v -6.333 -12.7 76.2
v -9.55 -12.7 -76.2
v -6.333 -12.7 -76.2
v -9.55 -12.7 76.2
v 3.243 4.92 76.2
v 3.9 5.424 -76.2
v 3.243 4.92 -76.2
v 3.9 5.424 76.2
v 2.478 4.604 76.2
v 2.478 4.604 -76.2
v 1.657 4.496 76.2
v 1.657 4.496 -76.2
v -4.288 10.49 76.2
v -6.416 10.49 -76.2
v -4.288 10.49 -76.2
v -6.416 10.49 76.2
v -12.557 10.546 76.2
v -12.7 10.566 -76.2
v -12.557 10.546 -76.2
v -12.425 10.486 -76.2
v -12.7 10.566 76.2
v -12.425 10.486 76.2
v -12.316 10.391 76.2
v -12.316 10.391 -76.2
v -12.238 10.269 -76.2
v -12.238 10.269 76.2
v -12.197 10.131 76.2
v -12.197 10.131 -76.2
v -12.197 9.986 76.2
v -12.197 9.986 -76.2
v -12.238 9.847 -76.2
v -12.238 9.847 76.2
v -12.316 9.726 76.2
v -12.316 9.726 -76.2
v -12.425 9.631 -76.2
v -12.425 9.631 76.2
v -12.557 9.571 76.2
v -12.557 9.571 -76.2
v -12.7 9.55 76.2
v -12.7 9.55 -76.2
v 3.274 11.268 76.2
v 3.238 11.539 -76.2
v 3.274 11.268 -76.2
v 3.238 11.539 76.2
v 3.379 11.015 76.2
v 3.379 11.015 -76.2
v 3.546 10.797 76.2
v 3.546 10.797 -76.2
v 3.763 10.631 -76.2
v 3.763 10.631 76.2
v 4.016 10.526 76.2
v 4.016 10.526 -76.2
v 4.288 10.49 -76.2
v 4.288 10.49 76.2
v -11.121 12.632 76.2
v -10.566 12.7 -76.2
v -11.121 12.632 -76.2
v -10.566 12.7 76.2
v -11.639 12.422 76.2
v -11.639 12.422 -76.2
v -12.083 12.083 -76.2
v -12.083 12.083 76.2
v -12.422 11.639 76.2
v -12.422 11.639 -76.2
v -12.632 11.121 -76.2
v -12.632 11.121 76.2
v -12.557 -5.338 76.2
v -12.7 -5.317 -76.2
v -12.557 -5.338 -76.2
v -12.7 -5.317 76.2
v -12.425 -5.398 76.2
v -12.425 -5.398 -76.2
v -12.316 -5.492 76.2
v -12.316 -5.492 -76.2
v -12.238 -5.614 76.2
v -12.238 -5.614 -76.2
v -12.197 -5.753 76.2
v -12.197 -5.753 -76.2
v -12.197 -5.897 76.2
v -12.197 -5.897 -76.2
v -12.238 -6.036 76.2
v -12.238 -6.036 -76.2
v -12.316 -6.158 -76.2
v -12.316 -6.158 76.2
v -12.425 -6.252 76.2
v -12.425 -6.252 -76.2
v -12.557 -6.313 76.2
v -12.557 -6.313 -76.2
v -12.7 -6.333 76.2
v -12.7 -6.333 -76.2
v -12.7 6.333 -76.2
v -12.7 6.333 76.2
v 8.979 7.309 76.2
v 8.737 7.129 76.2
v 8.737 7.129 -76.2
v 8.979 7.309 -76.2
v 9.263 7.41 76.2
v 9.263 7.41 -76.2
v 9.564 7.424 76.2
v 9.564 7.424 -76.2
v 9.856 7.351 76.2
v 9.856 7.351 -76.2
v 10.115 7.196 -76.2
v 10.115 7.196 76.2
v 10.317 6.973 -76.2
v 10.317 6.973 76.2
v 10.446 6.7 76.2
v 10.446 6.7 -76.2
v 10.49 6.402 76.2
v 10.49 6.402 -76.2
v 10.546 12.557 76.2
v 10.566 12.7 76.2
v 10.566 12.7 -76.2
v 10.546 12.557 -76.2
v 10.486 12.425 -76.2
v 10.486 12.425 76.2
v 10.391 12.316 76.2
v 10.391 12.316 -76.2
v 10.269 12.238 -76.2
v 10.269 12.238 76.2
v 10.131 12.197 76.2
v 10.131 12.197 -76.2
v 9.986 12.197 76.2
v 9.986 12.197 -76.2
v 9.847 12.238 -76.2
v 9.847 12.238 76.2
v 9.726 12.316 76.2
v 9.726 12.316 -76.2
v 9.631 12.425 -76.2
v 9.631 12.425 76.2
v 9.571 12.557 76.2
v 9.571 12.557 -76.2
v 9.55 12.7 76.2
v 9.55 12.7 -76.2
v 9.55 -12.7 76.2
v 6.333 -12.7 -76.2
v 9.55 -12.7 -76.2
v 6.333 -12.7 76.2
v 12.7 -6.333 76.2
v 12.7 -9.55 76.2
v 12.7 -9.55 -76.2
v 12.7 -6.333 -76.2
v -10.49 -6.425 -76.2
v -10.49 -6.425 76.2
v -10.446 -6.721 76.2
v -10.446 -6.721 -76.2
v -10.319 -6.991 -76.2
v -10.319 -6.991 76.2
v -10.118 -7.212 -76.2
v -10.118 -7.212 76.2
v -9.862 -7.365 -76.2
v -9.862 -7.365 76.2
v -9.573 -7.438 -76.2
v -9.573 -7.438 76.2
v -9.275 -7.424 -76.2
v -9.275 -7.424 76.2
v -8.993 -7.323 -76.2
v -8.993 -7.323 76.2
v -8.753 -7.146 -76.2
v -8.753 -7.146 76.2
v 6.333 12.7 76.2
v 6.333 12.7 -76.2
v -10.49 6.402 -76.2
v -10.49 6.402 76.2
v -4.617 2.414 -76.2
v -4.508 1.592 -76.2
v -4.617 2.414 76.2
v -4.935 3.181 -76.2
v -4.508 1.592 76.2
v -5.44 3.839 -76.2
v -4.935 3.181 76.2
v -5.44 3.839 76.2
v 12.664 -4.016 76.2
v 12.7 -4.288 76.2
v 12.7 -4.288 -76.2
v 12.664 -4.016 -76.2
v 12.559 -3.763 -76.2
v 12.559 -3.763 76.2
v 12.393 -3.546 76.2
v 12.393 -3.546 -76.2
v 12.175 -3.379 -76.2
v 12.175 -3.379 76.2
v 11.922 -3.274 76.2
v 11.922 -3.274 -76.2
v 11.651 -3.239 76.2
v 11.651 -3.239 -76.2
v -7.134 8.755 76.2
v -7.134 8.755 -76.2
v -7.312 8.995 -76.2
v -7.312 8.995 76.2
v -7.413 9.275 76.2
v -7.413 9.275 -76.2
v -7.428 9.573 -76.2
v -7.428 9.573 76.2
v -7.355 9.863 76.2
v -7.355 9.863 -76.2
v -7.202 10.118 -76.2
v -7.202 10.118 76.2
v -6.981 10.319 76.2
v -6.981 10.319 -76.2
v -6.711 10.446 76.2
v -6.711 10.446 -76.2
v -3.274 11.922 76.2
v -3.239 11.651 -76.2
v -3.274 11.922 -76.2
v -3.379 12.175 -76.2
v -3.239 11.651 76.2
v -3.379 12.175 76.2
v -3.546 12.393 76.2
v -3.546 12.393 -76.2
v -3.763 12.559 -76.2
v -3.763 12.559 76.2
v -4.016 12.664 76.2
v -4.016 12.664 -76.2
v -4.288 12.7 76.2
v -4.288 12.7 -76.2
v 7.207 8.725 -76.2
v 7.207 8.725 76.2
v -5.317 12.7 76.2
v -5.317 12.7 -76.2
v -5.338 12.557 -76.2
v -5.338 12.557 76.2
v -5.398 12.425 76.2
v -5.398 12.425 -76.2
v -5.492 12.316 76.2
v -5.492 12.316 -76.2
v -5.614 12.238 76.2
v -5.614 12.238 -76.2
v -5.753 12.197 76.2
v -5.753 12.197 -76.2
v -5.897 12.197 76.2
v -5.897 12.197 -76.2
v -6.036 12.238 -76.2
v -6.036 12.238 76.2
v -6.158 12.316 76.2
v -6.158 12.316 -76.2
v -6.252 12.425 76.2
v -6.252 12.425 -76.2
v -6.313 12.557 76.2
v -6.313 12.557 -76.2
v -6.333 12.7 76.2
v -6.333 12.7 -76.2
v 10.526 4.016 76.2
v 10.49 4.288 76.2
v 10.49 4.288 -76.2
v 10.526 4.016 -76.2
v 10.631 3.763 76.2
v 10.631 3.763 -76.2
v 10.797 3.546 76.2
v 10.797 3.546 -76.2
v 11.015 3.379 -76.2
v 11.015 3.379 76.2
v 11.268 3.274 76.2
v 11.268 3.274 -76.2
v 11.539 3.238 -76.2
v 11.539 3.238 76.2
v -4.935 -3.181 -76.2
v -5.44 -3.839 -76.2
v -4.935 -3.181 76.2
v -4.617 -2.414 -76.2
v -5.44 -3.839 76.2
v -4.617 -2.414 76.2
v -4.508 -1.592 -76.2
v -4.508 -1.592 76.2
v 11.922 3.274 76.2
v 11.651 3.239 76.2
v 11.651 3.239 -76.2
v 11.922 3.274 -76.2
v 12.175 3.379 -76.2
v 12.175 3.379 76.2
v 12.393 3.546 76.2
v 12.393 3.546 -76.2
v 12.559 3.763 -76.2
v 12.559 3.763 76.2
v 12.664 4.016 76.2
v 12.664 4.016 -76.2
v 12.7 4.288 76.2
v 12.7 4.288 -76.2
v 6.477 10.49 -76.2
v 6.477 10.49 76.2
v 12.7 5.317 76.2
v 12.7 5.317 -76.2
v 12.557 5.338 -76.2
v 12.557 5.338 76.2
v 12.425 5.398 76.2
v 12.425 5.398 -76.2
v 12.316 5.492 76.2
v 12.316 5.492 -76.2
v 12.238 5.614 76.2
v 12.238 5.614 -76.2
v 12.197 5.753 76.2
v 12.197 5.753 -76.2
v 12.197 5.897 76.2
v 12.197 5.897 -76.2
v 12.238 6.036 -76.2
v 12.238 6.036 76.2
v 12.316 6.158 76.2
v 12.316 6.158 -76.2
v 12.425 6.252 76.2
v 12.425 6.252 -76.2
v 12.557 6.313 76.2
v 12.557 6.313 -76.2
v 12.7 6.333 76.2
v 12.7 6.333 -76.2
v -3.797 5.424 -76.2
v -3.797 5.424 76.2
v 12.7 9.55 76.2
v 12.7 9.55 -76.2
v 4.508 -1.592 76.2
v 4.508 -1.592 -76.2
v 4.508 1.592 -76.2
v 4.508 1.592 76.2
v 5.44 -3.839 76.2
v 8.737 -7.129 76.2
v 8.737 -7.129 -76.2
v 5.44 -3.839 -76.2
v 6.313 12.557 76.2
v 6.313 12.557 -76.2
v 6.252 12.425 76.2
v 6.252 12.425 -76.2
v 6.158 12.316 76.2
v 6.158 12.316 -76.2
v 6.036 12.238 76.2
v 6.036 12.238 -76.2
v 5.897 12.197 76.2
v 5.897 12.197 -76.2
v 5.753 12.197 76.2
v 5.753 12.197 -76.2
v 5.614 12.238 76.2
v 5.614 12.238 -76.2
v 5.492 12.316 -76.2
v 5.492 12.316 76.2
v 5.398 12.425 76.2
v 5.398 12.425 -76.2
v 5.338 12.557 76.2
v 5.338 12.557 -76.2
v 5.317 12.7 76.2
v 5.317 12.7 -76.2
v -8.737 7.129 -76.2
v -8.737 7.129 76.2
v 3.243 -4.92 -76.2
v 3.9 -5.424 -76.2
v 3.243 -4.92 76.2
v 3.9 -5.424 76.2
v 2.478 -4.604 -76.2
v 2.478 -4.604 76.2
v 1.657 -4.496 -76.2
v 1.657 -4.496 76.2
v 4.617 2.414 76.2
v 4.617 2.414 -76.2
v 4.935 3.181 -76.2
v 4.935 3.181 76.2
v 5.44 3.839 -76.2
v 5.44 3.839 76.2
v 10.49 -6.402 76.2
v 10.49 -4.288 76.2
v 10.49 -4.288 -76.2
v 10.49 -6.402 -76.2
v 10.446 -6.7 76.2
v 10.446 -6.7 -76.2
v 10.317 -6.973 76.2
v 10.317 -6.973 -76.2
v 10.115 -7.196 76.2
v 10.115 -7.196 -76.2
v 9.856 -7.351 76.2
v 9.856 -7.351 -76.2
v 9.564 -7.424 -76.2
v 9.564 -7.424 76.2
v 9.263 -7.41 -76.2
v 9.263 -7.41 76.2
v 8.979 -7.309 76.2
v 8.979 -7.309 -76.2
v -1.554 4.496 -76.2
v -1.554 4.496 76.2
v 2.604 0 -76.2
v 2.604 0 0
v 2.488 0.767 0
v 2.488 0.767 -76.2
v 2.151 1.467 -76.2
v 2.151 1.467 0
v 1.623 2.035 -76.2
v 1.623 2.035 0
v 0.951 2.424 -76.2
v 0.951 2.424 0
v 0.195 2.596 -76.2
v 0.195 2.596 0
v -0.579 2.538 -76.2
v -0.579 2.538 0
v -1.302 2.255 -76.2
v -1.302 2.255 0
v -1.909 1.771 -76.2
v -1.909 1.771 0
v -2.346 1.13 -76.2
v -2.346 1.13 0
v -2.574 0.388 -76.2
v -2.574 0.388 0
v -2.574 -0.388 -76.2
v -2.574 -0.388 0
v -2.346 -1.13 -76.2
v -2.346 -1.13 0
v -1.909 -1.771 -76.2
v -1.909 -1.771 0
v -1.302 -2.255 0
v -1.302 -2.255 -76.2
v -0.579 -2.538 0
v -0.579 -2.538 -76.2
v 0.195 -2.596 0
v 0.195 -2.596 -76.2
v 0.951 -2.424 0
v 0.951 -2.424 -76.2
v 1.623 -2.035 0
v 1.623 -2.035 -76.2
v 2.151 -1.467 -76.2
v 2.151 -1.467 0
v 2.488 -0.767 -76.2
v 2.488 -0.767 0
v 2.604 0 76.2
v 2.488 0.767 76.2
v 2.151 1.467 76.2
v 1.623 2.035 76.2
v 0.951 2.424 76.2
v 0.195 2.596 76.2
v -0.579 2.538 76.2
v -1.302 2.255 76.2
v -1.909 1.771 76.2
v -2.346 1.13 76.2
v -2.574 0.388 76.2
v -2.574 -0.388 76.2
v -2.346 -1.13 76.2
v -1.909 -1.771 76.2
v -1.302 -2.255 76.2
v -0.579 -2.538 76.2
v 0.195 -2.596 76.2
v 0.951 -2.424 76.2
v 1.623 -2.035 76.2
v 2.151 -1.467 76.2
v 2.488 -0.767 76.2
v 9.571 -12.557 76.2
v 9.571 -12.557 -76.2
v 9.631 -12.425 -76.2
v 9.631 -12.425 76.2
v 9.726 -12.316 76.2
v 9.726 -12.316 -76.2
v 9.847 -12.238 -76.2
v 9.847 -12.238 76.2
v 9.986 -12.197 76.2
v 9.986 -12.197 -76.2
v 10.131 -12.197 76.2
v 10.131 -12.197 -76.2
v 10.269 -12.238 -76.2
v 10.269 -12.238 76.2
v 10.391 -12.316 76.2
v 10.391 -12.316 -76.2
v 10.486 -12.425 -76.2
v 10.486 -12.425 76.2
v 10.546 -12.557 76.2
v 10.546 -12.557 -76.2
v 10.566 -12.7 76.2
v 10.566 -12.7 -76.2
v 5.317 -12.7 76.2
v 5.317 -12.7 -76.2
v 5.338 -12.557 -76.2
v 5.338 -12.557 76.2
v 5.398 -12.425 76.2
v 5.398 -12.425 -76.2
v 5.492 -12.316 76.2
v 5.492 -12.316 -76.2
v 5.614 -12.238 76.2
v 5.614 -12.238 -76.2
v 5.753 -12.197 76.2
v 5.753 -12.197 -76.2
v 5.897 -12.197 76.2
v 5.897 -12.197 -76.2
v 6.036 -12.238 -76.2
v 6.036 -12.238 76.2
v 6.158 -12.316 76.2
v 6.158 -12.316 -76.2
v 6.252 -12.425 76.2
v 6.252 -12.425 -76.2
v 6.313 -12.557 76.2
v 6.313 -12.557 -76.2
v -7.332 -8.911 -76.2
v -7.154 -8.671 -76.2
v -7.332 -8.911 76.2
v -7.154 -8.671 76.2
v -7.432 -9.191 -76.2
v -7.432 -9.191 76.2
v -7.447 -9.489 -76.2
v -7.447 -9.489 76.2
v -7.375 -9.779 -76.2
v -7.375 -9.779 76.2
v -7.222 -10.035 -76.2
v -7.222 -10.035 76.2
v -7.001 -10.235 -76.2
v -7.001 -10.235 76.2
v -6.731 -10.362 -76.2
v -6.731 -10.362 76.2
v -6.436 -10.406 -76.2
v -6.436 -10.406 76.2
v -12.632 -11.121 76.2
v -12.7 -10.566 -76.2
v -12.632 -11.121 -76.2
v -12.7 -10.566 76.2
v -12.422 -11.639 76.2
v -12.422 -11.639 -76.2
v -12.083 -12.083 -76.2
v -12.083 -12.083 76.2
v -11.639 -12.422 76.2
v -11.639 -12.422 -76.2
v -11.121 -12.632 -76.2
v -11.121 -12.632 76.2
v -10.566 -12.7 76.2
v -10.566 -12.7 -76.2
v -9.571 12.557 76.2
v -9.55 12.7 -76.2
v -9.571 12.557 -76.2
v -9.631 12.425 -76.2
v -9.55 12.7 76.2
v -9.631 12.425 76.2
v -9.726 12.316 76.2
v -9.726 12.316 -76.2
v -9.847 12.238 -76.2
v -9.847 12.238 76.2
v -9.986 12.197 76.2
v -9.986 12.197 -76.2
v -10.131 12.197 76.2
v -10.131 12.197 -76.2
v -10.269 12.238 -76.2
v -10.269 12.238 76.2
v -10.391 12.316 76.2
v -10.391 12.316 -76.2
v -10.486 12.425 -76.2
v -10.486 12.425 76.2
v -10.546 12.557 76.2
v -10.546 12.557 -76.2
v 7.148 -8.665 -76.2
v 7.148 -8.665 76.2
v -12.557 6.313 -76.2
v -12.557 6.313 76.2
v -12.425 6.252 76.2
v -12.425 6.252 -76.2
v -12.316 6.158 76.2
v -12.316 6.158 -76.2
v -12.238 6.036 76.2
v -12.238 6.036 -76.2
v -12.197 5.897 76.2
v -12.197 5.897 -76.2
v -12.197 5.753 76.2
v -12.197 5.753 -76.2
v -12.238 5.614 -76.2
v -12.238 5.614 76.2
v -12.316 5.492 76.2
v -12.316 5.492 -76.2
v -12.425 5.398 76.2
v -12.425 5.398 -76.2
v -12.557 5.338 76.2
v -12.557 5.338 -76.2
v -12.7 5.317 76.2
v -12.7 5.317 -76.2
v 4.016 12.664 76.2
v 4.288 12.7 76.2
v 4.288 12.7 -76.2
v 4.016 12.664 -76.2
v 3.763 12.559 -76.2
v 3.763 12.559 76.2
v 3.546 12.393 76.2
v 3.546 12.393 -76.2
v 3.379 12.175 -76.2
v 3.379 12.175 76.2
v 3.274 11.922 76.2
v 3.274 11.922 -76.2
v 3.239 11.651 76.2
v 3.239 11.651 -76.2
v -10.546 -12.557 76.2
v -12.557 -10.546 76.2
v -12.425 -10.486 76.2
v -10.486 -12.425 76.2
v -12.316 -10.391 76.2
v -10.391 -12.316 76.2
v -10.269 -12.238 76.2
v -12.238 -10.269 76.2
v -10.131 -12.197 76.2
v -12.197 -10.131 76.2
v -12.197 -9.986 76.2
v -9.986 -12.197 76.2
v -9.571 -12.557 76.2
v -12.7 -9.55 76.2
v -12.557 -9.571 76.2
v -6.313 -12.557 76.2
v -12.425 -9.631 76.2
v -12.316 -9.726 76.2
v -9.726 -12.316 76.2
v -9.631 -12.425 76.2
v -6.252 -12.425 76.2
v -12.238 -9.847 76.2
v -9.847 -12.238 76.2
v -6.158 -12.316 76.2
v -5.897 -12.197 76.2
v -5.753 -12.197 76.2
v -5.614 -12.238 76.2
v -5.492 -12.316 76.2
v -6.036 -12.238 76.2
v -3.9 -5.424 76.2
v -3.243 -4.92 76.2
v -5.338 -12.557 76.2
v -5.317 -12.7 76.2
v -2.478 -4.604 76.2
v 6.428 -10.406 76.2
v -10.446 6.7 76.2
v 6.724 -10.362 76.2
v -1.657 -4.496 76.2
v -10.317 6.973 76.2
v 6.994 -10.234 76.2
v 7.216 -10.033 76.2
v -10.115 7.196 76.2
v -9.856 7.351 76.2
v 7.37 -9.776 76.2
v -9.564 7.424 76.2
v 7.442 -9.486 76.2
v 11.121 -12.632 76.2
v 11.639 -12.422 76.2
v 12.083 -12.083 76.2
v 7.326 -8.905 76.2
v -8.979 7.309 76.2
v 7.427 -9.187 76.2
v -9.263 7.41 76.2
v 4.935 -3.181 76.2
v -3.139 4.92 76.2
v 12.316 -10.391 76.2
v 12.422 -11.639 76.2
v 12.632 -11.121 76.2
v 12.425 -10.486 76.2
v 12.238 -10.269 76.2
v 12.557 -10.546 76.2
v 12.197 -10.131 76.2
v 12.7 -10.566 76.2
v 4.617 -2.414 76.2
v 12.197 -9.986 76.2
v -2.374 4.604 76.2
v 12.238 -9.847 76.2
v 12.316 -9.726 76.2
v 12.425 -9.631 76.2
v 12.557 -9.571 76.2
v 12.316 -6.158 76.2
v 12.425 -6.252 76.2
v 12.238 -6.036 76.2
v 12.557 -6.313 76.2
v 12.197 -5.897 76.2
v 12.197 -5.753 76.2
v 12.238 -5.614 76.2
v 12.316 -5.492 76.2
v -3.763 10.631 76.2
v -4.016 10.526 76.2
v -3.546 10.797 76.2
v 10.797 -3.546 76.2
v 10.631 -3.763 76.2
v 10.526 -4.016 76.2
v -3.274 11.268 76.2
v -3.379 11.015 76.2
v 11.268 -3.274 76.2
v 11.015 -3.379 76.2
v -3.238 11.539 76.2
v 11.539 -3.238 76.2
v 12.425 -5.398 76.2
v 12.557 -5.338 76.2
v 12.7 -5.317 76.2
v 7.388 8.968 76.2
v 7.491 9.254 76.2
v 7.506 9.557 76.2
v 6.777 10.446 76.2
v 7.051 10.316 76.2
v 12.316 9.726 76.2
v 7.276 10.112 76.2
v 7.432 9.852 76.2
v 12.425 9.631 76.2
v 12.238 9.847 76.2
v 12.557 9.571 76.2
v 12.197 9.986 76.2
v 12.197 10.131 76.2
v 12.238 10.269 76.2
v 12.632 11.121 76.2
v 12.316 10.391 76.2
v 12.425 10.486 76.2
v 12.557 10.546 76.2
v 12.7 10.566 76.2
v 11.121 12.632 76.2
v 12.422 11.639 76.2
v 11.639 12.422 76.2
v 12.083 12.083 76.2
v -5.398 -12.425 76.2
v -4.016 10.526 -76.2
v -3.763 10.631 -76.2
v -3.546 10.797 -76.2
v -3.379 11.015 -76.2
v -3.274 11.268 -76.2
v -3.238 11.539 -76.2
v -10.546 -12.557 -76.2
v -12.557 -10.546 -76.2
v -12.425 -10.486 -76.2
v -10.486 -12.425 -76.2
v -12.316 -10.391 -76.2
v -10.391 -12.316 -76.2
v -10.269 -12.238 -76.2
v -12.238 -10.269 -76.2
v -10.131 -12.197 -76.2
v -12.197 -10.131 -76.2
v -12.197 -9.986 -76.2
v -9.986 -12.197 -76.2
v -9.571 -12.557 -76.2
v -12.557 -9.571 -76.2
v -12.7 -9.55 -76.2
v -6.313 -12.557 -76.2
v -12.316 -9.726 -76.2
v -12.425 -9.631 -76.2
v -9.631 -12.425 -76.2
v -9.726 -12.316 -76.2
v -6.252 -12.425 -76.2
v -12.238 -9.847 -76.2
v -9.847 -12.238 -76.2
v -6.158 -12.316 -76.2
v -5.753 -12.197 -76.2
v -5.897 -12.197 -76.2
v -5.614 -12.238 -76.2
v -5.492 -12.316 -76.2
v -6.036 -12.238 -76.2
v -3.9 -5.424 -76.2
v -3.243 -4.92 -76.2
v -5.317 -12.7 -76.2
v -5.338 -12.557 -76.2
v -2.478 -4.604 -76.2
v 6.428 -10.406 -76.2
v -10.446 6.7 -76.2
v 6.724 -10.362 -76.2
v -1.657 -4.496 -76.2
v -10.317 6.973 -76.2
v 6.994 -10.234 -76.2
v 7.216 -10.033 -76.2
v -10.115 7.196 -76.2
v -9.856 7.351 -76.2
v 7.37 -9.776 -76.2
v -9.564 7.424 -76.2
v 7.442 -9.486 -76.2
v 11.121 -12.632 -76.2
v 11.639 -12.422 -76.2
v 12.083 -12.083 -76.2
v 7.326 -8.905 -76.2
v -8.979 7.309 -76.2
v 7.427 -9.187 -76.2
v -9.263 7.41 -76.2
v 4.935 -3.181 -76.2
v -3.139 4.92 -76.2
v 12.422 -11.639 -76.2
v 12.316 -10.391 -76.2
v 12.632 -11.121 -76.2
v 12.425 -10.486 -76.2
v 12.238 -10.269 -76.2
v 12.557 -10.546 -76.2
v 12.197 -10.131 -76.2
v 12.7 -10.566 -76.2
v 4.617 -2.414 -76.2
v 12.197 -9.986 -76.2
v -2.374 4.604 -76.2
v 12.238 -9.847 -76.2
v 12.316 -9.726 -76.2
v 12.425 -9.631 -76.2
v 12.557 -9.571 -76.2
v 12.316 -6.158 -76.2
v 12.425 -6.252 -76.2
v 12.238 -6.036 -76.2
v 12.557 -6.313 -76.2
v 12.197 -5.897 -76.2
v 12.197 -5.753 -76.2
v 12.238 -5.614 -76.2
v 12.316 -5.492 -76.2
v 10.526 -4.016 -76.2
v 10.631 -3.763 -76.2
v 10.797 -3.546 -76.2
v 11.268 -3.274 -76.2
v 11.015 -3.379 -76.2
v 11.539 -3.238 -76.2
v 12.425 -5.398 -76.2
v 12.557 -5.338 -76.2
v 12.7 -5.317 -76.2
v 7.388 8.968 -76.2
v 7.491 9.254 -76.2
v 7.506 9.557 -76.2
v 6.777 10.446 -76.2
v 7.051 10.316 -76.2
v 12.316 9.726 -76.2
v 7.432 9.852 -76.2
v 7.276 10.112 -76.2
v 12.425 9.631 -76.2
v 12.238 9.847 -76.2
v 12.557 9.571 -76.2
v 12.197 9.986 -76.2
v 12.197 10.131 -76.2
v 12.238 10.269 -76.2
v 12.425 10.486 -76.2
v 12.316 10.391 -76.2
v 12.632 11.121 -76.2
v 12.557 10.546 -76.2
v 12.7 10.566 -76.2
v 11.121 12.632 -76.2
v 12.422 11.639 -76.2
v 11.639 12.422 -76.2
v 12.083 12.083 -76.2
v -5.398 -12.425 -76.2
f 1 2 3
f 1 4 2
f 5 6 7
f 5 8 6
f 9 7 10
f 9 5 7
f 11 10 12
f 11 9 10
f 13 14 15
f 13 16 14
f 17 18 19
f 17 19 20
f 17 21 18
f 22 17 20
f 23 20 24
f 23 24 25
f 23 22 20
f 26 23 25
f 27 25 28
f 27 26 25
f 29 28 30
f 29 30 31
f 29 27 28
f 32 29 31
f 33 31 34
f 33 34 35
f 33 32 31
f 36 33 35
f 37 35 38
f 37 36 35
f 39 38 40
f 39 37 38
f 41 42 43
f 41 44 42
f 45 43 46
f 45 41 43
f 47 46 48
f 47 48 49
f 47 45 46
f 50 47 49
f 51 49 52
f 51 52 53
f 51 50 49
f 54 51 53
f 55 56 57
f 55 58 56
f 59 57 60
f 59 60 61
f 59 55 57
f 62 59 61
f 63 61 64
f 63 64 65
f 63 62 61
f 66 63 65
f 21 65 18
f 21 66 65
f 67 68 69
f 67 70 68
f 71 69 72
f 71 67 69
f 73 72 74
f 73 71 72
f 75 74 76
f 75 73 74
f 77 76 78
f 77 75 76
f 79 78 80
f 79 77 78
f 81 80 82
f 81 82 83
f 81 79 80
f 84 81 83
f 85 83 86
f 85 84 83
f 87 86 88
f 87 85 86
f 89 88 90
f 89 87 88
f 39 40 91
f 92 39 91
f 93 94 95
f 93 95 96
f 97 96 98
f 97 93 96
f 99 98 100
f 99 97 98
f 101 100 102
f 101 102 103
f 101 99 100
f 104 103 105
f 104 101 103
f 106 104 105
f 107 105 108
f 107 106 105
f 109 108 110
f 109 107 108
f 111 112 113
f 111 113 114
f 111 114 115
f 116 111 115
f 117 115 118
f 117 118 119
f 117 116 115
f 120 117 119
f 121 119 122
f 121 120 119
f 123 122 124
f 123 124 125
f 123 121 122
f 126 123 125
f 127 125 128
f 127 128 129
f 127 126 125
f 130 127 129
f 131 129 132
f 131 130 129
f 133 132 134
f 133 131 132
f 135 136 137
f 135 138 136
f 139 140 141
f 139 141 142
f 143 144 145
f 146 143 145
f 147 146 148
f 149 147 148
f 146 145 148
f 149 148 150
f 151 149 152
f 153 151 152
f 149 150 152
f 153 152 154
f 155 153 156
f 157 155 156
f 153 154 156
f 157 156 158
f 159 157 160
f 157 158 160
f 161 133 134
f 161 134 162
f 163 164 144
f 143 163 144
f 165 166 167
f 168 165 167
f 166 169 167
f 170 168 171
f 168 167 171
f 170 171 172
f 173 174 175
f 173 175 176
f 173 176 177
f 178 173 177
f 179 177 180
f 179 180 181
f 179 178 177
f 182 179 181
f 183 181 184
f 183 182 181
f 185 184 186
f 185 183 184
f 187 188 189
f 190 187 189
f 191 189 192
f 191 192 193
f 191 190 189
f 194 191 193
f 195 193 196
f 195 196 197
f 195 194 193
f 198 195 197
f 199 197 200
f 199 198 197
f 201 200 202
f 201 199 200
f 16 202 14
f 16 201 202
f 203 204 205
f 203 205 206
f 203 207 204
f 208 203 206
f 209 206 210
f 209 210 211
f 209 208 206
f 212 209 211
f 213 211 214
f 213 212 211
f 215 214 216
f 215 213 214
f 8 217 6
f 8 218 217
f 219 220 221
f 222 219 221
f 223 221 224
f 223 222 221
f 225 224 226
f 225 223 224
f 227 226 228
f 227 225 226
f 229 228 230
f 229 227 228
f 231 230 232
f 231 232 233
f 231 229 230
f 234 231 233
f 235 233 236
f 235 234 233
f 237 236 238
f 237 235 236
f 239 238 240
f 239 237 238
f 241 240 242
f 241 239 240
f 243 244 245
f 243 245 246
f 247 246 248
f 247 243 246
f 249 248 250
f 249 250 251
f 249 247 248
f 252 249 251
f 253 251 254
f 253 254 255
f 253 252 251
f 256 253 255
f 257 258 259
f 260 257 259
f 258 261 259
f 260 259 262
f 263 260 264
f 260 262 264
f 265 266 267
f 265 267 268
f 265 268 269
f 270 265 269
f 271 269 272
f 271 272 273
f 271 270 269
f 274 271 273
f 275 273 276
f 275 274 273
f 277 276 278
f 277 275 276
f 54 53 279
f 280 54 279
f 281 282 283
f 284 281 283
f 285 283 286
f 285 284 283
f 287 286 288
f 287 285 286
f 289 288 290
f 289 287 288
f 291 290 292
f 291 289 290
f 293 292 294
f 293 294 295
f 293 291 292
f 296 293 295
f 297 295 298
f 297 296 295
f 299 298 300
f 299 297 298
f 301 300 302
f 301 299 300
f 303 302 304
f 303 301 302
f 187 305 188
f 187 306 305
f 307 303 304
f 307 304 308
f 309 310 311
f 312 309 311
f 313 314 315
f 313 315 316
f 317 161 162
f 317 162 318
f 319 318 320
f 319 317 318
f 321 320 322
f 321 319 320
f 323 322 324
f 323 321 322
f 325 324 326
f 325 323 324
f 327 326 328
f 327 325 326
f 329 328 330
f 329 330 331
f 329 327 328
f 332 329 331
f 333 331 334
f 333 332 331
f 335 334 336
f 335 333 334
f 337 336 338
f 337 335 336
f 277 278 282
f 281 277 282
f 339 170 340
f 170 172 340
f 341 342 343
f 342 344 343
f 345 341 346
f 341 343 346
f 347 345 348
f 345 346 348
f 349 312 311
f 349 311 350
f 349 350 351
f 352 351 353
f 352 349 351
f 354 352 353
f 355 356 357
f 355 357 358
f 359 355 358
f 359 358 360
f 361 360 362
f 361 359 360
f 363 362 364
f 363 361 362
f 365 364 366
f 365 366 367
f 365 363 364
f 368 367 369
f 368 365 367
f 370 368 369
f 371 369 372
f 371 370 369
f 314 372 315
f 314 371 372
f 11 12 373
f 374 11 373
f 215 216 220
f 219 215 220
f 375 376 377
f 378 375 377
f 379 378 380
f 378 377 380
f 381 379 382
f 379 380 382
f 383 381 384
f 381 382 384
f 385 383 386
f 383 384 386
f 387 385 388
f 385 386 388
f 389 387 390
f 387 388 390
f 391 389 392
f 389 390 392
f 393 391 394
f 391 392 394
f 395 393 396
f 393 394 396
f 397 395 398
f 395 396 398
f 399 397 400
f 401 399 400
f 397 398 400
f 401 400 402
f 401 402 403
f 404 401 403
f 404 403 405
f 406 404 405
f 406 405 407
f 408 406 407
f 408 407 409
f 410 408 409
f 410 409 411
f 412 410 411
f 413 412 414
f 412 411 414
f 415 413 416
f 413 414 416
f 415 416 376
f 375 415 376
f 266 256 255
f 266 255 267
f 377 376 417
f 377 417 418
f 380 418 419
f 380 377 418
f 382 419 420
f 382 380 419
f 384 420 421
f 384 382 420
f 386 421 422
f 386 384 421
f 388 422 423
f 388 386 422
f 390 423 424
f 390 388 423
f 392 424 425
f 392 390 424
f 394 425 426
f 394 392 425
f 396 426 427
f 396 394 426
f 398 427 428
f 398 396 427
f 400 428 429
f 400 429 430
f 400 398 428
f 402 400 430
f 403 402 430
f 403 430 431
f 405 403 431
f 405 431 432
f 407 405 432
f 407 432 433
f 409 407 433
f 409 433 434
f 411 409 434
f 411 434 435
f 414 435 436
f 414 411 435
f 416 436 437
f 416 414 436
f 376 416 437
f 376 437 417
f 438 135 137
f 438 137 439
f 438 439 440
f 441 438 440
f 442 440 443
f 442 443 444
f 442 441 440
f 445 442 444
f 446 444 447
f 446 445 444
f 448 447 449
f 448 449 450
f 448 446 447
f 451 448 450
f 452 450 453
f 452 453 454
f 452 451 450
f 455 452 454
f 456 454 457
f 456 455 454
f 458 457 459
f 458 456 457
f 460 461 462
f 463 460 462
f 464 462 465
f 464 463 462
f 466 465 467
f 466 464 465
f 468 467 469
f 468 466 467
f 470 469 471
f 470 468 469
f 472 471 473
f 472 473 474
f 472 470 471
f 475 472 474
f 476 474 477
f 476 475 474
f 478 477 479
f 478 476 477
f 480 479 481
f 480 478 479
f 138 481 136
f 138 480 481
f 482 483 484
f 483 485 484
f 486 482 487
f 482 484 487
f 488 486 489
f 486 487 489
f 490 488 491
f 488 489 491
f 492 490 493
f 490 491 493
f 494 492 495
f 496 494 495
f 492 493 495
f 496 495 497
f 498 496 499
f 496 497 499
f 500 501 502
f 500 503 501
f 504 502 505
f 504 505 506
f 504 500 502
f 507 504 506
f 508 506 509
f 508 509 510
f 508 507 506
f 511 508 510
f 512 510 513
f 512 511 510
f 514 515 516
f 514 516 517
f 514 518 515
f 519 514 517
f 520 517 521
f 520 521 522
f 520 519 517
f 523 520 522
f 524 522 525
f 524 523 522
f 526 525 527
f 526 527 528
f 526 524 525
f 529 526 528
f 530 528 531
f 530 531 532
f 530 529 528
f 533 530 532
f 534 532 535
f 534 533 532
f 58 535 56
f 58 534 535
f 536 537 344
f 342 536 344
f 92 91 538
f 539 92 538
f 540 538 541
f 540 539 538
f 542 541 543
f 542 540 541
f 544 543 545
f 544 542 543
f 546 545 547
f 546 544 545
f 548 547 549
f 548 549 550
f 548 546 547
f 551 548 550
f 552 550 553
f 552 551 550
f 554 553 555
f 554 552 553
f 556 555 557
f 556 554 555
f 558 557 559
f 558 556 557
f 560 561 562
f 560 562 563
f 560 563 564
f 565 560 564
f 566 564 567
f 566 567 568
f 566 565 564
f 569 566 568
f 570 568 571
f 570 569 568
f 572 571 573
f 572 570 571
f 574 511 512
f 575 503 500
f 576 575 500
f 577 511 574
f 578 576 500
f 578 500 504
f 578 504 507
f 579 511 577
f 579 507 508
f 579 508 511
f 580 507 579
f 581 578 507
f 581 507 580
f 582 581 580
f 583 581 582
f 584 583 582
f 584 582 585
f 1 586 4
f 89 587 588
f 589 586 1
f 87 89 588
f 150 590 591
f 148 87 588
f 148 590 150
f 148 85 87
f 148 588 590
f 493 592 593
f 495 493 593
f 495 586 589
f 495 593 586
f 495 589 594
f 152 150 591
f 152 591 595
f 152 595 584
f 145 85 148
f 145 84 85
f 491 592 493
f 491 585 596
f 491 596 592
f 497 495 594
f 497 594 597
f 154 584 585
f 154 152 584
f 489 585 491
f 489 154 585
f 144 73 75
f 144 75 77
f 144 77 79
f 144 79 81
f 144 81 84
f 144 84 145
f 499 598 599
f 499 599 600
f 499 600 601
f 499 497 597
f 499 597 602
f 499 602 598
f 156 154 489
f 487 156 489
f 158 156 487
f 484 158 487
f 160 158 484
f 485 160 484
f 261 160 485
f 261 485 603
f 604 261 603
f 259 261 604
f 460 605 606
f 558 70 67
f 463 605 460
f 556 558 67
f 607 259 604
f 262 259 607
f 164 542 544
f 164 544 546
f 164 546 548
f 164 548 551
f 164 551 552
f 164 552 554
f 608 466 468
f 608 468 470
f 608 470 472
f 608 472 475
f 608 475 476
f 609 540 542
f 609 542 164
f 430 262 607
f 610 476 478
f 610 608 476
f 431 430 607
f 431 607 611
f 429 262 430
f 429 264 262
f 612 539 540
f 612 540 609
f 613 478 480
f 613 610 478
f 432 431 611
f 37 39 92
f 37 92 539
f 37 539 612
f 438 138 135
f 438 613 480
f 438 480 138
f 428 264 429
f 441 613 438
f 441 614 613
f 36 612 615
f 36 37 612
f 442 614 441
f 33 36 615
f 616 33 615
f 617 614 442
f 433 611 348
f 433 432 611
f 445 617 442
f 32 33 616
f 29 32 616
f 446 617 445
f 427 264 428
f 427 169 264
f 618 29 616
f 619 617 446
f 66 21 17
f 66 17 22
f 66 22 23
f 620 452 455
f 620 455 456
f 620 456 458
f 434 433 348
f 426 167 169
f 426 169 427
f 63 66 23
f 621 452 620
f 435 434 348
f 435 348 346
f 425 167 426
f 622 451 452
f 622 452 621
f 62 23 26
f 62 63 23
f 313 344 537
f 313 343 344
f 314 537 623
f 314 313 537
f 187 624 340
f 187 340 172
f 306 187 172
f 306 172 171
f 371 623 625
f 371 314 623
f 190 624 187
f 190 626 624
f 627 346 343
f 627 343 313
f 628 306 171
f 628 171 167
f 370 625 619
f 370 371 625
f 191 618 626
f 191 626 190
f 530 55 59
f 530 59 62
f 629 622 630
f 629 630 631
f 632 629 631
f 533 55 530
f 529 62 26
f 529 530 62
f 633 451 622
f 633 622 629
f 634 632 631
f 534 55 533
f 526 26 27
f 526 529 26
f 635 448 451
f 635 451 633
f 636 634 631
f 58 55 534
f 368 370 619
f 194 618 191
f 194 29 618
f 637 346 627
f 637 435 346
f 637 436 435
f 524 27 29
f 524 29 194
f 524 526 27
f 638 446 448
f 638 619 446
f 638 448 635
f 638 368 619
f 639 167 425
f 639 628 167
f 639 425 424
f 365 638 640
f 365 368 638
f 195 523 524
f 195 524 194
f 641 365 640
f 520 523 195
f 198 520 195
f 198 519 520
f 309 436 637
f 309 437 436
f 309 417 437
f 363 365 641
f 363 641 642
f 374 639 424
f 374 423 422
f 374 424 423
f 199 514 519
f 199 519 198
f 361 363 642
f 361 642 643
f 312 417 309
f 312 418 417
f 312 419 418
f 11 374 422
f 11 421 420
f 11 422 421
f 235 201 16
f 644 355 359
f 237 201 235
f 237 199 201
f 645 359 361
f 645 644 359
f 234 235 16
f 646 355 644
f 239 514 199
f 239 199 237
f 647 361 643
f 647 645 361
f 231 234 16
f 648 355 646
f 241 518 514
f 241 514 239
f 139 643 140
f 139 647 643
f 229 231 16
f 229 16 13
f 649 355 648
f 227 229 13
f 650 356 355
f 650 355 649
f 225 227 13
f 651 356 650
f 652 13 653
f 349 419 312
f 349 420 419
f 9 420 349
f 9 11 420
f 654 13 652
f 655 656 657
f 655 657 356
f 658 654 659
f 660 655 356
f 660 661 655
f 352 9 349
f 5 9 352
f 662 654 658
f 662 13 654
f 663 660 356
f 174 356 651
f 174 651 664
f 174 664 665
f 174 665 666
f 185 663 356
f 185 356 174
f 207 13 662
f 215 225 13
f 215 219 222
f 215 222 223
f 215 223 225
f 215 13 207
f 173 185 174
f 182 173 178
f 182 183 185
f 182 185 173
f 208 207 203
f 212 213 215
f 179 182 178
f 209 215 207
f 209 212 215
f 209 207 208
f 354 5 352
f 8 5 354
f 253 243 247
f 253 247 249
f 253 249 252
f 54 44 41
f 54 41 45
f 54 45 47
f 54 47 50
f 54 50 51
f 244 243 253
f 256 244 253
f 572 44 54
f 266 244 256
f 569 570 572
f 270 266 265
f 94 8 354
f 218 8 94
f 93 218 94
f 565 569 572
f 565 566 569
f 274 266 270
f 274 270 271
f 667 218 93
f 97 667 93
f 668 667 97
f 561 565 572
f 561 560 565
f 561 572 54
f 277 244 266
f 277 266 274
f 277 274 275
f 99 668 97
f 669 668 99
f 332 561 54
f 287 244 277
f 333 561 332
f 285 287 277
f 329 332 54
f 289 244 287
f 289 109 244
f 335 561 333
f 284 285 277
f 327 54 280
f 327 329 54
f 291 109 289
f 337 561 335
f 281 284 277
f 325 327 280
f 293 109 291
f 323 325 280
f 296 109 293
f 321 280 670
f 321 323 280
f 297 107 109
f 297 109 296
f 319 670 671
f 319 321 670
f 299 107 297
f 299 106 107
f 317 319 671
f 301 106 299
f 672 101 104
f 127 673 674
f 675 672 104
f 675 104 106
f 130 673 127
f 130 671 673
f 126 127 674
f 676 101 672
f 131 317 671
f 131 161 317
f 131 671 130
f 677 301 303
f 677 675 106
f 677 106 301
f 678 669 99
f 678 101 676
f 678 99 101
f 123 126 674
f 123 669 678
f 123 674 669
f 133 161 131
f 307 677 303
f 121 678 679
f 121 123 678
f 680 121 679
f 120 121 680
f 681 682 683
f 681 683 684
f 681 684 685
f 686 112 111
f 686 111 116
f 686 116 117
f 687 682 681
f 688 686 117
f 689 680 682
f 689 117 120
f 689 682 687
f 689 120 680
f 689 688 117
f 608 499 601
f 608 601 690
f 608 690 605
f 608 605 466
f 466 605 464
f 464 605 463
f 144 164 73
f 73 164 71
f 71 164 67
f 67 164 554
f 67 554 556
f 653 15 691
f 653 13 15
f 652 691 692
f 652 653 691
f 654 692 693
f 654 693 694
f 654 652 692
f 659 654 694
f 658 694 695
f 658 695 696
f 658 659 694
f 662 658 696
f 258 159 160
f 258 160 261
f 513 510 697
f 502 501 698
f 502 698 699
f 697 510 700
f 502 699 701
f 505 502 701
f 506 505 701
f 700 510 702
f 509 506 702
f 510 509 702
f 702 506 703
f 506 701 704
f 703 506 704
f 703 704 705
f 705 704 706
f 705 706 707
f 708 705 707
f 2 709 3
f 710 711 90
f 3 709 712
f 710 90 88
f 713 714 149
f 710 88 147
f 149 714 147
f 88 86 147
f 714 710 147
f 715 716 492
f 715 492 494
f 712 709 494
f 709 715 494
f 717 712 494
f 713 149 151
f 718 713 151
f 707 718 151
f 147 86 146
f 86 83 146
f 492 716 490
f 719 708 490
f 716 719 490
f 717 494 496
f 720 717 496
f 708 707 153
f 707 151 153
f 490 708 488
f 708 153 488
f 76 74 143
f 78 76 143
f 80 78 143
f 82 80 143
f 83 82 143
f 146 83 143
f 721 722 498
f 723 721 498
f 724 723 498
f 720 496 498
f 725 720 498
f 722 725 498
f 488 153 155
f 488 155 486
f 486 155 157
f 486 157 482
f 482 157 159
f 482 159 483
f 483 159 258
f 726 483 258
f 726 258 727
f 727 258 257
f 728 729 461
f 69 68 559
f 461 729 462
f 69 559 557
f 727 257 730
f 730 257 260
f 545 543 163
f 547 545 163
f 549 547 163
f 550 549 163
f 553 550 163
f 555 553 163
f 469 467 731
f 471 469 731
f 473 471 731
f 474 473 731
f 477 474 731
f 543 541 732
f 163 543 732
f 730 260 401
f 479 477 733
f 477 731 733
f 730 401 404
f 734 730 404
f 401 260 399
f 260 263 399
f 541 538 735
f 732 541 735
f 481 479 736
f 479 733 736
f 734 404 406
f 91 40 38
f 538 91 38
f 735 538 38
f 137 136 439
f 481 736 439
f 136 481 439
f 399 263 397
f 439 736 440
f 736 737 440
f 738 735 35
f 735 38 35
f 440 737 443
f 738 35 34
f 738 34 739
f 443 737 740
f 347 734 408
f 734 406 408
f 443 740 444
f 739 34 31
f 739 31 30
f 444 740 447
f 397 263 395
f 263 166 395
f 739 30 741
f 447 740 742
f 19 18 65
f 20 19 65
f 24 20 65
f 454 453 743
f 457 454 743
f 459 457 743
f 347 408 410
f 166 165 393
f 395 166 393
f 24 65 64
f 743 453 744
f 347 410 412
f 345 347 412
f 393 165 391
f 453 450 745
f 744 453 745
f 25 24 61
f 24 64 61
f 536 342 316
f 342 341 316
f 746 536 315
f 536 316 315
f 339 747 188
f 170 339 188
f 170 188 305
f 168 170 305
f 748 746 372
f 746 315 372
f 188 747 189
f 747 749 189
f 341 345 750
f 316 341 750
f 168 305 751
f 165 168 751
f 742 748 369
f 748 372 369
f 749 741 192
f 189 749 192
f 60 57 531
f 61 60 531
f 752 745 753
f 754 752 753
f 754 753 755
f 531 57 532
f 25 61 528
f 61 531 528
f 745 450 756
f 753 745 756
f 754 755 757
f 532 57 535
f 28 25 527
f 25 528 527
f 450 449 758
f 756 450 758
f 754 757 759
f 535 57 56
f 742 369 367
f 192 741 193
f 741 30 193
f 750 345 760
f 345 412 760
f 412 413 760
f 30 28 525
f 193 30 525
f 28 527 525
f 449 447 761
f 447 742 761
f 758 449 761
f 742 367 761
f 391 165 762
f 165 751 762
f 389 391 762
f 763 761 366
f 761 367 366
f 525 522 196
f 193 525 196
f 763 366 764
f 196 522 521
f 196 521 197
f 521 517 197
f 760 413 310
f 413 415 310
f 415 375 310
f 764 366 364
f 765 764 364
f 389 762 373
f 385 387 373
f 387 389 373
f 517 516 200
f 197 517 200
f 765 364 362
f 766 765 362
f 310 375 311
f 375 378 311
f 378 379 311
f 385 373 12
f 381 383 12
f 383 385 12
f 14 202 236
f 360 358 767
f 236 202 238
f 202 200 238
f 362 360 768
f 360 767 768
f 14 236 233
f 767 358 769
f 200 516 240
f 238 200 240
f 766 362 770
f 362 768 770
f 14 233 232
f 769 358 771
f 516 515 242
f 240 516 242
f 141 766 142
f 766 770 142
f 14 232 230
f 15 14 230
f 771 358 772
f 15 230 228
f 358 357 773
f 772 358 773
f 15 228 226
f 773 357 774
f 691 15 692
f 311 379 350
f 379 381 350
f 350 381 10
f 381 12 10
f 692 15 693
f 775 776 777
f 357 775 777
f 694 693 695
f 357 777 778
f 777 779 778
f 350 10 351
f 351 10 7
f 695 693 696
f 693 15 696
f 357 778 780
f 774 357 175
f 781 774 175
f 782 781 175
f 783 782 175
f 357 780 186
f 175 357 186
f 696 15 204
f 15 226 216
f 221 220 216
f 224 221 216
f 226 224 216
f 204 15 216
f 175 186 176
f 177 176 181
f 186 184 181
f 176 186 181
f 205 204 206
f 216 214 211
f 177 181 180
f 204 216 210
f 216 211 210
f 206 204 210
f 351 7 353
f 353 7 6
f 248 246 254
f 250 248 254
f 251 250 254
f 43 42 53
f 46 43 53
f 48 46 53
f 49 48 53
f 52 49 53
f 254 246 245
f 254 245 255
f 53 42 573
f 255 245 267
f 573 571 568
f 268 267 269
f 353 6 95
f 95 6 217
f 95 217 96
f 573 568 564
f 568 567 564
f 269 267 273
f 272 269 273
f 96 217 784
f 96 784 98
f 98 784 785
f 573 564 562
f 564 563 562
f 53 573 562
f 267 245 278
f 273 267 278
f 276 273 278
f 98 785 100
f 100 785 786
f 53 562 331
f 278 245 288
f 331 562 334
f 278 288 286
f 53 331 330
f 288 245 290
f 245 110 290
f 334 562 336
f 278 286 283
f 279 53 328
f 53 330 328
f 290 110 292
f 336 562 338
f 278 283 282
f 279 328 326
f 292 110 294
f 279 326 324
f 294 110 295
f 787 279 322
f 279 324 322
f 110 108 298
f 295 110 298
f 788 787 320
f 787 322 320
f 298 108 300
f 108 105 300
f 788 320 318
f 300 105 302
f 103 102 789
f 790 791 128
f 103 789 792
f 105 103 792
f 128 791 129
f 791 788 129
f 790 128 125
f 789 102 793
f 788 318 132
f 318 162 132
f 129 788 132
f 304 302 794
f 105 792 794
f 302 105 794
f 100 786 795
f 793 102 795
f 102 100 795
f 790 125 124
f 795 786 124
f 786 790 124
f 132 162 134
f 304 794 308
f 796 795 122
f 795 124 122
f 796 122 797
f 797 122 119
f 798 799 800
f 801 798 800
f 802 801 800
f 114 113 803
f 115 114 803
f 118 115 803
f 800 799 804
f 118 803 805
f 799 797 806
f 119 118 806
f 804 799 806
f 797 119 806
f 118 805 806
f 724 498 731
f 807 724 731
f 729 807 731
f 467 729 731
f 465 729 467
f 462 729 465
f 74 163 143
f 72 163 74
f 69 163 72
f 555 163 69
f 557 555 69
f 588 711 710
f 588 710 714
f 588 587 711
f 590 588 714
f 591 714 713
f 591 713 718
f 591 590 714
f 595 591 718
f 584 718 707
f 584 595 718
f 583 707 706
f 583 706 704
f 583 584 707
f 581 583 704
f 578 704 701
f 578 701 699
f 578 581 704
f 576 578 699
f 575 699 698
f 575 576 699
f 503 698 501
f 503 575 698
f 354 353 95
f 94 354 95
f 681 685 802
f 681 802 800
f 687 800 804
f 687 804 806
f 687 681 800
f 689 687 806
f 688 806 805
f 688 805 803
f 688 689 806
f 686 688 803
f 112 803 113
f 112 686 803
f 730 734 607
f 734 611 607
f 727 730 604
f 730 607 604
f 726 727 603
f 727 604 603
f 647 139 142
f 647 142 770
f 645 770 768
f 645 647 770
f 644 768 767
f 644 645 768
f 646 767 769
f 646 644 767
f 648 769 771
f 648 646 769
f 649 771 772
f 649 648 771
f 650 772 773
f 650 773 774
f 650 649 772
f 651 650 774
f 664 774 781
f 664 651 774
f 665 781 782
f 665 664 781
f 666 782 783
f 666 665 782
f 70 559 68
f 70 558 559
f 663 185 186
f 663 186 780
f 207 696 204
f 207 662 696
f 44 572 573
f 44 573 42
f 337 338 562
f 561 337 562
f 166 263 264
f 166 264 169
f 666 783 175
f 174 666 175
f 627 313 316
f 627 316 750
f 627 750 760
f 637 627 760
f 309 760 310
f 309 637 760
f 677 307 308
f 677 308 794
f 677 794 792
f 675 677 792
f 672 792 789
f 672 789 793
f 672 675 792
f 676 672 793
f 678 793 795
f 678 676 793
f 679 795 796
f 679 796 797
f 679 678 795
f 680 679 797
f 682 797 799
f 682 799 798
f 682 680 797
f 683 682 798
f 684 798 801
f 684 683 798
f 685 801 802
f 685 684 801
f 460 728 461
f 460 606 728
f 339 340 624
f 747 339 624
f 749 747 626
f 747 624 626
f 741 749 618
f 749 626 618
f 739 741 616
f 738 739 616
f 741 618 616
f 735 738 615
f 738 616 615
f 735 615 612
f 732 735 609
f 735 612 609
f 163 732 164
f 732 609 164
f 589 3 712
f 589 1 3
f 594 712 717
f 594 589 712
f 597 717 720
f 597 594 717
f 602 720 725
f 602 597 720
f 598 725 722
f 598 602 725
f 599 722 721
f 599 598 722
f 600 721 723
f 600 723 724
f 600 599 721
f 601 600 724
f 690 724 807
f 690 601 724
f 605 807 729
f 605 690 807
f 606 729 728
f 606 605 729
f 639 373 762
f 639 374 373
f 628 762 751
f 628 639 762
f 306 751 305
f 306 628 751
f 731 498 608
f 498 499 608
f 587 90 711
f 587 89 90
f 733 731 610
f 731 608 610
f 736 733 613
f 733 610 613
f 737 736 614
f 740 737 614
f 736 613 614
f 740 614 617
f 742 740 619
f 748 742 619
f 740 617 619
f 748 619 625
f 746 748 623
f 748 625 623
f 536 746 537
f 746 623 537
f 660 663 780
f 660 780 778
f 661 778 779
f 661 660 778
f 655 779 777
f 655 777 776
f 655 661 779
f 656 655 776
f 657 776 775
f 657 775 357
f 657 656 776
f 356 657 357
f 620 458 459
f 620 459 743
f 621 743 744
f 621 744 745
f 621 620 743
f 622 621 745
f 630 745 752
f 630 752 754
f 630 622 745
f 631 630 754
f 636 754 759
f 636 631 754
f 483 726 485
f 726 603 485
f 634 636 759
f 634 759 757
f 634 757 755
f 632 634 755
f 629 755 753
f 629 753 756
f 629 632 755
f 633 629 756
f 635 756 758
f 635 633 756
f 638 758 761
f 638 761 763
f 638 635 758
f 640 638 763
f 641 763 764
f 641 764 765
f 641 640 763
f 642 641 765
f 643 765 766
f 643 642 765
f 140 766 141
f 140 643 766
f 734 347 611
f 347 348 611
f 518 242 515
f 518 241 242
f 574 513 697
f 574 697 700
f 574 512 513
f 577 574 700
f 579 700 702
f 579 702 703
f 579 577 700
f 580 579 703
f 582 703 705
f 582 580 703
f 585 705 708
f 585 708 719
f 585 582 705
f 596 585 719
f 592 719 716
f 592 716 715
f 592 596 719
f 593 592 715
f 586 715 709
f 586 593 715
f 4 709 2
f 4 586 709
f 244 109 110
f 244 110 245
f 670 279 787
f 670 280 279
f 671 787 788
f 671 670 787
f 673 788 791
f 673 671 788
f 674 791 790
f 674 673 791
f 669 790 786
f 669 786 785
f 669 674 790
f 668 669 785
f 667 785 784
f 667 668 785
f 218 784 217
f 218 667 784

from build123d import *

# Parameters (mm, degrees)
SKETCH3_R                = 2.6035
BOSS_EXTRUDE1_DEPTH      = 76.2
BOSS_EXTRUDE1_DEPTH_BACK = 76.2


with BuildPart() as part:
    # Sketch3 → Boss-Extrude1 (new body, two sides)
    with BuildSketch(Plane.XY) as boss_extrude1_sk:
        with BuildLine():
            Line((6.3331344, -12.7), (9.5504, -12.7))
            ThreePointArc((9.5504, -12.7), (10.058323491, -12.192000006), (10.566399977, -12.699846982))
            ThreePointArc((10.566399977, -12.699846982), (12.082522516, -12.082522516), (12.699846982, -10.566399977))
            ThreePointArc((12.699846982, -10.566399977), (12.192000006, -10.058323491), (12.7, -9.5504))
            Line((12.7, -9.5504), (12.7, -6.3330836))
            ThreePointArc((12.7, -6.3330836), (12.192, -5.8250836), (12.7, -5.3170836))
            Line((12.7, -5.3170836), (12.7, -4.28752))
            ThreePointArc((12.7, -4.28752), (12.392749156, -3.545750844), (11.65098, -3.2385))
            Line((11.65098, -3.2385), (11.53922, -3.2385))
            ThreePointArc((11.53922, -3.2385), (10.797450844, -3.545750844), (10.4902, -4.28752))
            Line((10.4902, -4.28752), (10.4902, -6.402089023))
            ThreePointArc((10.4902, -6.402089023), (9.856394933, -7.351113629), (8.736962546, -7.129240479))
            Line((8.736962546, -7.129240479), (5.440484187, -3.838768792))
            ThreePointArc((5.440484187, -3.838768792), (4.75073678, -2.808015636), (4.5085, -1.591658411))
            Line((4.5085, -1.591658411), (4.5085, 1.591658411))
            ThreePointArc((4.5085, 1.591658411), (4.75073678, 2.808015636), (5.440484187, 3.838768792))
            Line((5.440484187, 3.838768792), (8.736962546, 7.129240479))
            ThreePointArc((8.736962546, 7.129240479), (9.856394933, 7.351113629), (10.4902, 6.402089023))
            Line((10.4902, 6.402089023), (10.4902, 4.28752))
            ThreePointArc((10.4902, 4.28752), (10.797450844, 3.545750844), (11.53922, 3.2385))
            Line((11.53922, 3.2385), (11.65098, 3.2385))
            ThreePointArc((11.65098, 3.2385), (12.392749156, 3.545750844), (12.7, 4.28752))
            Line((12.7, 4.28752), (12.7, 5.3171344))
            ThreePointArc((12.7, 5.3171344), (12.192, 5.8251344), (12.7, 6.3331344))
            Line((12.7, 6.3331344), (12.7, 9.5504))
            ThreePointArc((12.7, 9.5504), (12.192000006, 10.058323491), (12.699846982, 10.566399977))
            ThreePointArc((12.699846982, 10.566399977), (12.082522516, 12.082522516), (10.566399977, 12.699846982))
            ThreePointArc((10.566399977, 12.699846982), (10.058323491, 12.192000006), (9.5504, 12.7))
            Line((9.5504, 12.7), (6.3330836, 12.7))
            ThreePointArc((6.3330836, 12.7), (5.8250836, 12.192), (5.3170836, 12.7))
            Line((5.3170836, 12.7), (4.28752, 12.7))
            ThreePointArc((4.28752, 12.7), (3.545750844, 12.392749156), (3.2385, 11.65098))
            Line((3.2385, 11.65098), (3.2385, 11.53922))
            ThreePointArc((3.2385, 11.53922), (3.545750844, 10.797450844), (4.28752, 10.4902))
            Line((4.28752, 10.4902), (6.476795923, 10.4902))
            ThreePointArc((6.476795923, 10.4902), (7.432175542, 9.851520654), (7.207206853, 8.724555432))
            Line((7.207206853, 8.724555432), (3.900315394, 5.423689619))
            ThreePointArc((3.900315394, 5.423689619), (2.8709819, 4.736928798), (1.657299581, 4.4958))
            Line((1.657299581, 4.4958), (-1.553667902, 4.4958))
            ThreePointArc((-1.553667902, 4.4958), (-2.767350221, 4.736928798), (-3.796683715, 5.423689619))
            Line((-3.796683715, 5.423689619), (-7.134200223, 8.755124678))
            ThreePointArc((-7.134200223, 8.755124678), (-7.355273948, 9.862578342), (-6.416435163, 10.4902))
            Line((-6.416435163, 10.4902), (-4.28752, 10.4902))
            ThreePointArc((-4.28752, 10.4902), (-3.545750844, 10.797450844), (-3.2385, 11.53922))
            Line((-3.2385, 11.53922), (-3.2385, 11.65098))
            ThreePointArc((-3.2385, 11.65098), (-3.545750844, 12.392749156), (-4.28752, 12.7))
            Line((-4.28752, 12.7), (-5.3171344, 12.7))
            ThreePointArc((-5.3171344, 12.7), (-5.8251344, 12.192), (-6.3331344, 12.7))
            Line((-6.3331344, 12.7), (-9.5504, 12.7))
            ThreePointArc((-9.5504, 12.7), (-10.058323491, 12.192000006), (-10.566399977, 12.699846982))
            ThreePointArc((-10.566399977, 12.699846982), (-12.082522516, 12.082522516), (-12.699846982, 10.566399977))
            ThreePointArc((-12.699846982, 10.566399977), (-12.192000006, 10.058323491), (-12.7, 9.5504))
            Line((-12.7, 9.5504), (-12.7, 6.3331344))
            ThreePointArc((-12.7, 6.3331344), (-12.192, 5.8251344), (-12.7, 5.3171344))
            Line((-12.7, 5.3171344), (-12.7, -5.3170836))
            ThreePointArc((-12.7, -5.3170836), (-12.192, -5.8250836), (-12.7, -6.3330836))
            Line((-12.7, -6.3330836), (-12.7, -9.5504))
            ThreePointArc((-12.7, -9.5504), (-12.192000006, -10.058323491), (-12.699846982, -10.566399977))
            ThreePointArc((-12.699846982, -10.566399977), (-12.082522516, -12.082522516), (-10.566399977, -12.699846982))
            ThreePointArc((-10.566399977, -12.699846982), (-10.058323491, -12.192000006), (-9.5504, -12.7))
            Line((-9.5504, -12.7), (-6.3330836, -12.7))
            ThreePointArc((-6.3330836, -12.7), (-5.8250836, -12.192), (-5.3170836, -12.7))
            Line((-5.3170836, -12.7), (5.3171344, -12.7))
            ThreePointArc((5.3171344, -12.7), (5.8251344, -12.192), (6.3331344, -12.7))
        make_face()
        Circle(SKETCH3_R, mode=Mode.SUBTRACT)
        with BuildLine():
            Line((-8.753441447, -7.145689354), (-5.440484187, -3.838768792))
            ThreePointArc((-5.440484187, -3.838768792), (-4.75073678, -2.808015636), (-4.5085, -1.591658411))
            Line((-4.5085, -1.591658411), (-4.5085, 1.591658411))
            ThreePointArc((-4.5085, 1.591658411), (-4.75073678, 2.808015636), (-5.440484187, 3.838768792))
            Line((-5.440484187, 3.838768792), (-8.736962546, 7.129240479))
            ThreePointArc((-8.736962546, 7.129240479), (-9.856394933, 7.351113629), (-10.4902, 6.402089023))
            Line((-10.4902, 6.402089023), (-10.4902, -6.425372487))
            ThreePointArc((-10.4902, -6.425372487), (-9.862352148, -7.36547709), (-8.753441447, -7.145689354))
        make_face(mode=Mode.SUBTRACT)
        with BuildLine():
            Line((7.147805753, -8.66526257), (3.900315394, -5.423689619))
            ThreePointArc((3.900315394, -5.423689619), (2.8709819, -4.736928798), (1.657299581, -4.4958))
            Line((1.657299581, -4.4958), (-1.657299581, -4.4958))
            ThreePointArc((-1.657299581, -4.4958), (-2.8709819, -4.736928798), (-3.900315394, -5.423689619))
            Line((-3.900315394, -5.423689619), (-7.153722341, -8.671168377))
            ThreePointArc((-7.153722341, -8.671168377), (-7.374796065, -9.77862204), (-6.435957281, -10.406243698))
            Line((-6.435957281, -10.406243698), (6.427597582, -10.406243698))
            ThreePointArc((6.427597582, -10.406243698), (7.369631963, -9.776485757), (7.147805753, -8.66526257))
        make_face(mode=Mode.SUBTRACT)
    extrude(amount=BOSS_EXTRUDE1_DEPTH)
    extrude(boss_extrude1_sk.sketch, amount=-BOSS_EXTRUDE1_DEPTH_BACK)


solid = part.part
